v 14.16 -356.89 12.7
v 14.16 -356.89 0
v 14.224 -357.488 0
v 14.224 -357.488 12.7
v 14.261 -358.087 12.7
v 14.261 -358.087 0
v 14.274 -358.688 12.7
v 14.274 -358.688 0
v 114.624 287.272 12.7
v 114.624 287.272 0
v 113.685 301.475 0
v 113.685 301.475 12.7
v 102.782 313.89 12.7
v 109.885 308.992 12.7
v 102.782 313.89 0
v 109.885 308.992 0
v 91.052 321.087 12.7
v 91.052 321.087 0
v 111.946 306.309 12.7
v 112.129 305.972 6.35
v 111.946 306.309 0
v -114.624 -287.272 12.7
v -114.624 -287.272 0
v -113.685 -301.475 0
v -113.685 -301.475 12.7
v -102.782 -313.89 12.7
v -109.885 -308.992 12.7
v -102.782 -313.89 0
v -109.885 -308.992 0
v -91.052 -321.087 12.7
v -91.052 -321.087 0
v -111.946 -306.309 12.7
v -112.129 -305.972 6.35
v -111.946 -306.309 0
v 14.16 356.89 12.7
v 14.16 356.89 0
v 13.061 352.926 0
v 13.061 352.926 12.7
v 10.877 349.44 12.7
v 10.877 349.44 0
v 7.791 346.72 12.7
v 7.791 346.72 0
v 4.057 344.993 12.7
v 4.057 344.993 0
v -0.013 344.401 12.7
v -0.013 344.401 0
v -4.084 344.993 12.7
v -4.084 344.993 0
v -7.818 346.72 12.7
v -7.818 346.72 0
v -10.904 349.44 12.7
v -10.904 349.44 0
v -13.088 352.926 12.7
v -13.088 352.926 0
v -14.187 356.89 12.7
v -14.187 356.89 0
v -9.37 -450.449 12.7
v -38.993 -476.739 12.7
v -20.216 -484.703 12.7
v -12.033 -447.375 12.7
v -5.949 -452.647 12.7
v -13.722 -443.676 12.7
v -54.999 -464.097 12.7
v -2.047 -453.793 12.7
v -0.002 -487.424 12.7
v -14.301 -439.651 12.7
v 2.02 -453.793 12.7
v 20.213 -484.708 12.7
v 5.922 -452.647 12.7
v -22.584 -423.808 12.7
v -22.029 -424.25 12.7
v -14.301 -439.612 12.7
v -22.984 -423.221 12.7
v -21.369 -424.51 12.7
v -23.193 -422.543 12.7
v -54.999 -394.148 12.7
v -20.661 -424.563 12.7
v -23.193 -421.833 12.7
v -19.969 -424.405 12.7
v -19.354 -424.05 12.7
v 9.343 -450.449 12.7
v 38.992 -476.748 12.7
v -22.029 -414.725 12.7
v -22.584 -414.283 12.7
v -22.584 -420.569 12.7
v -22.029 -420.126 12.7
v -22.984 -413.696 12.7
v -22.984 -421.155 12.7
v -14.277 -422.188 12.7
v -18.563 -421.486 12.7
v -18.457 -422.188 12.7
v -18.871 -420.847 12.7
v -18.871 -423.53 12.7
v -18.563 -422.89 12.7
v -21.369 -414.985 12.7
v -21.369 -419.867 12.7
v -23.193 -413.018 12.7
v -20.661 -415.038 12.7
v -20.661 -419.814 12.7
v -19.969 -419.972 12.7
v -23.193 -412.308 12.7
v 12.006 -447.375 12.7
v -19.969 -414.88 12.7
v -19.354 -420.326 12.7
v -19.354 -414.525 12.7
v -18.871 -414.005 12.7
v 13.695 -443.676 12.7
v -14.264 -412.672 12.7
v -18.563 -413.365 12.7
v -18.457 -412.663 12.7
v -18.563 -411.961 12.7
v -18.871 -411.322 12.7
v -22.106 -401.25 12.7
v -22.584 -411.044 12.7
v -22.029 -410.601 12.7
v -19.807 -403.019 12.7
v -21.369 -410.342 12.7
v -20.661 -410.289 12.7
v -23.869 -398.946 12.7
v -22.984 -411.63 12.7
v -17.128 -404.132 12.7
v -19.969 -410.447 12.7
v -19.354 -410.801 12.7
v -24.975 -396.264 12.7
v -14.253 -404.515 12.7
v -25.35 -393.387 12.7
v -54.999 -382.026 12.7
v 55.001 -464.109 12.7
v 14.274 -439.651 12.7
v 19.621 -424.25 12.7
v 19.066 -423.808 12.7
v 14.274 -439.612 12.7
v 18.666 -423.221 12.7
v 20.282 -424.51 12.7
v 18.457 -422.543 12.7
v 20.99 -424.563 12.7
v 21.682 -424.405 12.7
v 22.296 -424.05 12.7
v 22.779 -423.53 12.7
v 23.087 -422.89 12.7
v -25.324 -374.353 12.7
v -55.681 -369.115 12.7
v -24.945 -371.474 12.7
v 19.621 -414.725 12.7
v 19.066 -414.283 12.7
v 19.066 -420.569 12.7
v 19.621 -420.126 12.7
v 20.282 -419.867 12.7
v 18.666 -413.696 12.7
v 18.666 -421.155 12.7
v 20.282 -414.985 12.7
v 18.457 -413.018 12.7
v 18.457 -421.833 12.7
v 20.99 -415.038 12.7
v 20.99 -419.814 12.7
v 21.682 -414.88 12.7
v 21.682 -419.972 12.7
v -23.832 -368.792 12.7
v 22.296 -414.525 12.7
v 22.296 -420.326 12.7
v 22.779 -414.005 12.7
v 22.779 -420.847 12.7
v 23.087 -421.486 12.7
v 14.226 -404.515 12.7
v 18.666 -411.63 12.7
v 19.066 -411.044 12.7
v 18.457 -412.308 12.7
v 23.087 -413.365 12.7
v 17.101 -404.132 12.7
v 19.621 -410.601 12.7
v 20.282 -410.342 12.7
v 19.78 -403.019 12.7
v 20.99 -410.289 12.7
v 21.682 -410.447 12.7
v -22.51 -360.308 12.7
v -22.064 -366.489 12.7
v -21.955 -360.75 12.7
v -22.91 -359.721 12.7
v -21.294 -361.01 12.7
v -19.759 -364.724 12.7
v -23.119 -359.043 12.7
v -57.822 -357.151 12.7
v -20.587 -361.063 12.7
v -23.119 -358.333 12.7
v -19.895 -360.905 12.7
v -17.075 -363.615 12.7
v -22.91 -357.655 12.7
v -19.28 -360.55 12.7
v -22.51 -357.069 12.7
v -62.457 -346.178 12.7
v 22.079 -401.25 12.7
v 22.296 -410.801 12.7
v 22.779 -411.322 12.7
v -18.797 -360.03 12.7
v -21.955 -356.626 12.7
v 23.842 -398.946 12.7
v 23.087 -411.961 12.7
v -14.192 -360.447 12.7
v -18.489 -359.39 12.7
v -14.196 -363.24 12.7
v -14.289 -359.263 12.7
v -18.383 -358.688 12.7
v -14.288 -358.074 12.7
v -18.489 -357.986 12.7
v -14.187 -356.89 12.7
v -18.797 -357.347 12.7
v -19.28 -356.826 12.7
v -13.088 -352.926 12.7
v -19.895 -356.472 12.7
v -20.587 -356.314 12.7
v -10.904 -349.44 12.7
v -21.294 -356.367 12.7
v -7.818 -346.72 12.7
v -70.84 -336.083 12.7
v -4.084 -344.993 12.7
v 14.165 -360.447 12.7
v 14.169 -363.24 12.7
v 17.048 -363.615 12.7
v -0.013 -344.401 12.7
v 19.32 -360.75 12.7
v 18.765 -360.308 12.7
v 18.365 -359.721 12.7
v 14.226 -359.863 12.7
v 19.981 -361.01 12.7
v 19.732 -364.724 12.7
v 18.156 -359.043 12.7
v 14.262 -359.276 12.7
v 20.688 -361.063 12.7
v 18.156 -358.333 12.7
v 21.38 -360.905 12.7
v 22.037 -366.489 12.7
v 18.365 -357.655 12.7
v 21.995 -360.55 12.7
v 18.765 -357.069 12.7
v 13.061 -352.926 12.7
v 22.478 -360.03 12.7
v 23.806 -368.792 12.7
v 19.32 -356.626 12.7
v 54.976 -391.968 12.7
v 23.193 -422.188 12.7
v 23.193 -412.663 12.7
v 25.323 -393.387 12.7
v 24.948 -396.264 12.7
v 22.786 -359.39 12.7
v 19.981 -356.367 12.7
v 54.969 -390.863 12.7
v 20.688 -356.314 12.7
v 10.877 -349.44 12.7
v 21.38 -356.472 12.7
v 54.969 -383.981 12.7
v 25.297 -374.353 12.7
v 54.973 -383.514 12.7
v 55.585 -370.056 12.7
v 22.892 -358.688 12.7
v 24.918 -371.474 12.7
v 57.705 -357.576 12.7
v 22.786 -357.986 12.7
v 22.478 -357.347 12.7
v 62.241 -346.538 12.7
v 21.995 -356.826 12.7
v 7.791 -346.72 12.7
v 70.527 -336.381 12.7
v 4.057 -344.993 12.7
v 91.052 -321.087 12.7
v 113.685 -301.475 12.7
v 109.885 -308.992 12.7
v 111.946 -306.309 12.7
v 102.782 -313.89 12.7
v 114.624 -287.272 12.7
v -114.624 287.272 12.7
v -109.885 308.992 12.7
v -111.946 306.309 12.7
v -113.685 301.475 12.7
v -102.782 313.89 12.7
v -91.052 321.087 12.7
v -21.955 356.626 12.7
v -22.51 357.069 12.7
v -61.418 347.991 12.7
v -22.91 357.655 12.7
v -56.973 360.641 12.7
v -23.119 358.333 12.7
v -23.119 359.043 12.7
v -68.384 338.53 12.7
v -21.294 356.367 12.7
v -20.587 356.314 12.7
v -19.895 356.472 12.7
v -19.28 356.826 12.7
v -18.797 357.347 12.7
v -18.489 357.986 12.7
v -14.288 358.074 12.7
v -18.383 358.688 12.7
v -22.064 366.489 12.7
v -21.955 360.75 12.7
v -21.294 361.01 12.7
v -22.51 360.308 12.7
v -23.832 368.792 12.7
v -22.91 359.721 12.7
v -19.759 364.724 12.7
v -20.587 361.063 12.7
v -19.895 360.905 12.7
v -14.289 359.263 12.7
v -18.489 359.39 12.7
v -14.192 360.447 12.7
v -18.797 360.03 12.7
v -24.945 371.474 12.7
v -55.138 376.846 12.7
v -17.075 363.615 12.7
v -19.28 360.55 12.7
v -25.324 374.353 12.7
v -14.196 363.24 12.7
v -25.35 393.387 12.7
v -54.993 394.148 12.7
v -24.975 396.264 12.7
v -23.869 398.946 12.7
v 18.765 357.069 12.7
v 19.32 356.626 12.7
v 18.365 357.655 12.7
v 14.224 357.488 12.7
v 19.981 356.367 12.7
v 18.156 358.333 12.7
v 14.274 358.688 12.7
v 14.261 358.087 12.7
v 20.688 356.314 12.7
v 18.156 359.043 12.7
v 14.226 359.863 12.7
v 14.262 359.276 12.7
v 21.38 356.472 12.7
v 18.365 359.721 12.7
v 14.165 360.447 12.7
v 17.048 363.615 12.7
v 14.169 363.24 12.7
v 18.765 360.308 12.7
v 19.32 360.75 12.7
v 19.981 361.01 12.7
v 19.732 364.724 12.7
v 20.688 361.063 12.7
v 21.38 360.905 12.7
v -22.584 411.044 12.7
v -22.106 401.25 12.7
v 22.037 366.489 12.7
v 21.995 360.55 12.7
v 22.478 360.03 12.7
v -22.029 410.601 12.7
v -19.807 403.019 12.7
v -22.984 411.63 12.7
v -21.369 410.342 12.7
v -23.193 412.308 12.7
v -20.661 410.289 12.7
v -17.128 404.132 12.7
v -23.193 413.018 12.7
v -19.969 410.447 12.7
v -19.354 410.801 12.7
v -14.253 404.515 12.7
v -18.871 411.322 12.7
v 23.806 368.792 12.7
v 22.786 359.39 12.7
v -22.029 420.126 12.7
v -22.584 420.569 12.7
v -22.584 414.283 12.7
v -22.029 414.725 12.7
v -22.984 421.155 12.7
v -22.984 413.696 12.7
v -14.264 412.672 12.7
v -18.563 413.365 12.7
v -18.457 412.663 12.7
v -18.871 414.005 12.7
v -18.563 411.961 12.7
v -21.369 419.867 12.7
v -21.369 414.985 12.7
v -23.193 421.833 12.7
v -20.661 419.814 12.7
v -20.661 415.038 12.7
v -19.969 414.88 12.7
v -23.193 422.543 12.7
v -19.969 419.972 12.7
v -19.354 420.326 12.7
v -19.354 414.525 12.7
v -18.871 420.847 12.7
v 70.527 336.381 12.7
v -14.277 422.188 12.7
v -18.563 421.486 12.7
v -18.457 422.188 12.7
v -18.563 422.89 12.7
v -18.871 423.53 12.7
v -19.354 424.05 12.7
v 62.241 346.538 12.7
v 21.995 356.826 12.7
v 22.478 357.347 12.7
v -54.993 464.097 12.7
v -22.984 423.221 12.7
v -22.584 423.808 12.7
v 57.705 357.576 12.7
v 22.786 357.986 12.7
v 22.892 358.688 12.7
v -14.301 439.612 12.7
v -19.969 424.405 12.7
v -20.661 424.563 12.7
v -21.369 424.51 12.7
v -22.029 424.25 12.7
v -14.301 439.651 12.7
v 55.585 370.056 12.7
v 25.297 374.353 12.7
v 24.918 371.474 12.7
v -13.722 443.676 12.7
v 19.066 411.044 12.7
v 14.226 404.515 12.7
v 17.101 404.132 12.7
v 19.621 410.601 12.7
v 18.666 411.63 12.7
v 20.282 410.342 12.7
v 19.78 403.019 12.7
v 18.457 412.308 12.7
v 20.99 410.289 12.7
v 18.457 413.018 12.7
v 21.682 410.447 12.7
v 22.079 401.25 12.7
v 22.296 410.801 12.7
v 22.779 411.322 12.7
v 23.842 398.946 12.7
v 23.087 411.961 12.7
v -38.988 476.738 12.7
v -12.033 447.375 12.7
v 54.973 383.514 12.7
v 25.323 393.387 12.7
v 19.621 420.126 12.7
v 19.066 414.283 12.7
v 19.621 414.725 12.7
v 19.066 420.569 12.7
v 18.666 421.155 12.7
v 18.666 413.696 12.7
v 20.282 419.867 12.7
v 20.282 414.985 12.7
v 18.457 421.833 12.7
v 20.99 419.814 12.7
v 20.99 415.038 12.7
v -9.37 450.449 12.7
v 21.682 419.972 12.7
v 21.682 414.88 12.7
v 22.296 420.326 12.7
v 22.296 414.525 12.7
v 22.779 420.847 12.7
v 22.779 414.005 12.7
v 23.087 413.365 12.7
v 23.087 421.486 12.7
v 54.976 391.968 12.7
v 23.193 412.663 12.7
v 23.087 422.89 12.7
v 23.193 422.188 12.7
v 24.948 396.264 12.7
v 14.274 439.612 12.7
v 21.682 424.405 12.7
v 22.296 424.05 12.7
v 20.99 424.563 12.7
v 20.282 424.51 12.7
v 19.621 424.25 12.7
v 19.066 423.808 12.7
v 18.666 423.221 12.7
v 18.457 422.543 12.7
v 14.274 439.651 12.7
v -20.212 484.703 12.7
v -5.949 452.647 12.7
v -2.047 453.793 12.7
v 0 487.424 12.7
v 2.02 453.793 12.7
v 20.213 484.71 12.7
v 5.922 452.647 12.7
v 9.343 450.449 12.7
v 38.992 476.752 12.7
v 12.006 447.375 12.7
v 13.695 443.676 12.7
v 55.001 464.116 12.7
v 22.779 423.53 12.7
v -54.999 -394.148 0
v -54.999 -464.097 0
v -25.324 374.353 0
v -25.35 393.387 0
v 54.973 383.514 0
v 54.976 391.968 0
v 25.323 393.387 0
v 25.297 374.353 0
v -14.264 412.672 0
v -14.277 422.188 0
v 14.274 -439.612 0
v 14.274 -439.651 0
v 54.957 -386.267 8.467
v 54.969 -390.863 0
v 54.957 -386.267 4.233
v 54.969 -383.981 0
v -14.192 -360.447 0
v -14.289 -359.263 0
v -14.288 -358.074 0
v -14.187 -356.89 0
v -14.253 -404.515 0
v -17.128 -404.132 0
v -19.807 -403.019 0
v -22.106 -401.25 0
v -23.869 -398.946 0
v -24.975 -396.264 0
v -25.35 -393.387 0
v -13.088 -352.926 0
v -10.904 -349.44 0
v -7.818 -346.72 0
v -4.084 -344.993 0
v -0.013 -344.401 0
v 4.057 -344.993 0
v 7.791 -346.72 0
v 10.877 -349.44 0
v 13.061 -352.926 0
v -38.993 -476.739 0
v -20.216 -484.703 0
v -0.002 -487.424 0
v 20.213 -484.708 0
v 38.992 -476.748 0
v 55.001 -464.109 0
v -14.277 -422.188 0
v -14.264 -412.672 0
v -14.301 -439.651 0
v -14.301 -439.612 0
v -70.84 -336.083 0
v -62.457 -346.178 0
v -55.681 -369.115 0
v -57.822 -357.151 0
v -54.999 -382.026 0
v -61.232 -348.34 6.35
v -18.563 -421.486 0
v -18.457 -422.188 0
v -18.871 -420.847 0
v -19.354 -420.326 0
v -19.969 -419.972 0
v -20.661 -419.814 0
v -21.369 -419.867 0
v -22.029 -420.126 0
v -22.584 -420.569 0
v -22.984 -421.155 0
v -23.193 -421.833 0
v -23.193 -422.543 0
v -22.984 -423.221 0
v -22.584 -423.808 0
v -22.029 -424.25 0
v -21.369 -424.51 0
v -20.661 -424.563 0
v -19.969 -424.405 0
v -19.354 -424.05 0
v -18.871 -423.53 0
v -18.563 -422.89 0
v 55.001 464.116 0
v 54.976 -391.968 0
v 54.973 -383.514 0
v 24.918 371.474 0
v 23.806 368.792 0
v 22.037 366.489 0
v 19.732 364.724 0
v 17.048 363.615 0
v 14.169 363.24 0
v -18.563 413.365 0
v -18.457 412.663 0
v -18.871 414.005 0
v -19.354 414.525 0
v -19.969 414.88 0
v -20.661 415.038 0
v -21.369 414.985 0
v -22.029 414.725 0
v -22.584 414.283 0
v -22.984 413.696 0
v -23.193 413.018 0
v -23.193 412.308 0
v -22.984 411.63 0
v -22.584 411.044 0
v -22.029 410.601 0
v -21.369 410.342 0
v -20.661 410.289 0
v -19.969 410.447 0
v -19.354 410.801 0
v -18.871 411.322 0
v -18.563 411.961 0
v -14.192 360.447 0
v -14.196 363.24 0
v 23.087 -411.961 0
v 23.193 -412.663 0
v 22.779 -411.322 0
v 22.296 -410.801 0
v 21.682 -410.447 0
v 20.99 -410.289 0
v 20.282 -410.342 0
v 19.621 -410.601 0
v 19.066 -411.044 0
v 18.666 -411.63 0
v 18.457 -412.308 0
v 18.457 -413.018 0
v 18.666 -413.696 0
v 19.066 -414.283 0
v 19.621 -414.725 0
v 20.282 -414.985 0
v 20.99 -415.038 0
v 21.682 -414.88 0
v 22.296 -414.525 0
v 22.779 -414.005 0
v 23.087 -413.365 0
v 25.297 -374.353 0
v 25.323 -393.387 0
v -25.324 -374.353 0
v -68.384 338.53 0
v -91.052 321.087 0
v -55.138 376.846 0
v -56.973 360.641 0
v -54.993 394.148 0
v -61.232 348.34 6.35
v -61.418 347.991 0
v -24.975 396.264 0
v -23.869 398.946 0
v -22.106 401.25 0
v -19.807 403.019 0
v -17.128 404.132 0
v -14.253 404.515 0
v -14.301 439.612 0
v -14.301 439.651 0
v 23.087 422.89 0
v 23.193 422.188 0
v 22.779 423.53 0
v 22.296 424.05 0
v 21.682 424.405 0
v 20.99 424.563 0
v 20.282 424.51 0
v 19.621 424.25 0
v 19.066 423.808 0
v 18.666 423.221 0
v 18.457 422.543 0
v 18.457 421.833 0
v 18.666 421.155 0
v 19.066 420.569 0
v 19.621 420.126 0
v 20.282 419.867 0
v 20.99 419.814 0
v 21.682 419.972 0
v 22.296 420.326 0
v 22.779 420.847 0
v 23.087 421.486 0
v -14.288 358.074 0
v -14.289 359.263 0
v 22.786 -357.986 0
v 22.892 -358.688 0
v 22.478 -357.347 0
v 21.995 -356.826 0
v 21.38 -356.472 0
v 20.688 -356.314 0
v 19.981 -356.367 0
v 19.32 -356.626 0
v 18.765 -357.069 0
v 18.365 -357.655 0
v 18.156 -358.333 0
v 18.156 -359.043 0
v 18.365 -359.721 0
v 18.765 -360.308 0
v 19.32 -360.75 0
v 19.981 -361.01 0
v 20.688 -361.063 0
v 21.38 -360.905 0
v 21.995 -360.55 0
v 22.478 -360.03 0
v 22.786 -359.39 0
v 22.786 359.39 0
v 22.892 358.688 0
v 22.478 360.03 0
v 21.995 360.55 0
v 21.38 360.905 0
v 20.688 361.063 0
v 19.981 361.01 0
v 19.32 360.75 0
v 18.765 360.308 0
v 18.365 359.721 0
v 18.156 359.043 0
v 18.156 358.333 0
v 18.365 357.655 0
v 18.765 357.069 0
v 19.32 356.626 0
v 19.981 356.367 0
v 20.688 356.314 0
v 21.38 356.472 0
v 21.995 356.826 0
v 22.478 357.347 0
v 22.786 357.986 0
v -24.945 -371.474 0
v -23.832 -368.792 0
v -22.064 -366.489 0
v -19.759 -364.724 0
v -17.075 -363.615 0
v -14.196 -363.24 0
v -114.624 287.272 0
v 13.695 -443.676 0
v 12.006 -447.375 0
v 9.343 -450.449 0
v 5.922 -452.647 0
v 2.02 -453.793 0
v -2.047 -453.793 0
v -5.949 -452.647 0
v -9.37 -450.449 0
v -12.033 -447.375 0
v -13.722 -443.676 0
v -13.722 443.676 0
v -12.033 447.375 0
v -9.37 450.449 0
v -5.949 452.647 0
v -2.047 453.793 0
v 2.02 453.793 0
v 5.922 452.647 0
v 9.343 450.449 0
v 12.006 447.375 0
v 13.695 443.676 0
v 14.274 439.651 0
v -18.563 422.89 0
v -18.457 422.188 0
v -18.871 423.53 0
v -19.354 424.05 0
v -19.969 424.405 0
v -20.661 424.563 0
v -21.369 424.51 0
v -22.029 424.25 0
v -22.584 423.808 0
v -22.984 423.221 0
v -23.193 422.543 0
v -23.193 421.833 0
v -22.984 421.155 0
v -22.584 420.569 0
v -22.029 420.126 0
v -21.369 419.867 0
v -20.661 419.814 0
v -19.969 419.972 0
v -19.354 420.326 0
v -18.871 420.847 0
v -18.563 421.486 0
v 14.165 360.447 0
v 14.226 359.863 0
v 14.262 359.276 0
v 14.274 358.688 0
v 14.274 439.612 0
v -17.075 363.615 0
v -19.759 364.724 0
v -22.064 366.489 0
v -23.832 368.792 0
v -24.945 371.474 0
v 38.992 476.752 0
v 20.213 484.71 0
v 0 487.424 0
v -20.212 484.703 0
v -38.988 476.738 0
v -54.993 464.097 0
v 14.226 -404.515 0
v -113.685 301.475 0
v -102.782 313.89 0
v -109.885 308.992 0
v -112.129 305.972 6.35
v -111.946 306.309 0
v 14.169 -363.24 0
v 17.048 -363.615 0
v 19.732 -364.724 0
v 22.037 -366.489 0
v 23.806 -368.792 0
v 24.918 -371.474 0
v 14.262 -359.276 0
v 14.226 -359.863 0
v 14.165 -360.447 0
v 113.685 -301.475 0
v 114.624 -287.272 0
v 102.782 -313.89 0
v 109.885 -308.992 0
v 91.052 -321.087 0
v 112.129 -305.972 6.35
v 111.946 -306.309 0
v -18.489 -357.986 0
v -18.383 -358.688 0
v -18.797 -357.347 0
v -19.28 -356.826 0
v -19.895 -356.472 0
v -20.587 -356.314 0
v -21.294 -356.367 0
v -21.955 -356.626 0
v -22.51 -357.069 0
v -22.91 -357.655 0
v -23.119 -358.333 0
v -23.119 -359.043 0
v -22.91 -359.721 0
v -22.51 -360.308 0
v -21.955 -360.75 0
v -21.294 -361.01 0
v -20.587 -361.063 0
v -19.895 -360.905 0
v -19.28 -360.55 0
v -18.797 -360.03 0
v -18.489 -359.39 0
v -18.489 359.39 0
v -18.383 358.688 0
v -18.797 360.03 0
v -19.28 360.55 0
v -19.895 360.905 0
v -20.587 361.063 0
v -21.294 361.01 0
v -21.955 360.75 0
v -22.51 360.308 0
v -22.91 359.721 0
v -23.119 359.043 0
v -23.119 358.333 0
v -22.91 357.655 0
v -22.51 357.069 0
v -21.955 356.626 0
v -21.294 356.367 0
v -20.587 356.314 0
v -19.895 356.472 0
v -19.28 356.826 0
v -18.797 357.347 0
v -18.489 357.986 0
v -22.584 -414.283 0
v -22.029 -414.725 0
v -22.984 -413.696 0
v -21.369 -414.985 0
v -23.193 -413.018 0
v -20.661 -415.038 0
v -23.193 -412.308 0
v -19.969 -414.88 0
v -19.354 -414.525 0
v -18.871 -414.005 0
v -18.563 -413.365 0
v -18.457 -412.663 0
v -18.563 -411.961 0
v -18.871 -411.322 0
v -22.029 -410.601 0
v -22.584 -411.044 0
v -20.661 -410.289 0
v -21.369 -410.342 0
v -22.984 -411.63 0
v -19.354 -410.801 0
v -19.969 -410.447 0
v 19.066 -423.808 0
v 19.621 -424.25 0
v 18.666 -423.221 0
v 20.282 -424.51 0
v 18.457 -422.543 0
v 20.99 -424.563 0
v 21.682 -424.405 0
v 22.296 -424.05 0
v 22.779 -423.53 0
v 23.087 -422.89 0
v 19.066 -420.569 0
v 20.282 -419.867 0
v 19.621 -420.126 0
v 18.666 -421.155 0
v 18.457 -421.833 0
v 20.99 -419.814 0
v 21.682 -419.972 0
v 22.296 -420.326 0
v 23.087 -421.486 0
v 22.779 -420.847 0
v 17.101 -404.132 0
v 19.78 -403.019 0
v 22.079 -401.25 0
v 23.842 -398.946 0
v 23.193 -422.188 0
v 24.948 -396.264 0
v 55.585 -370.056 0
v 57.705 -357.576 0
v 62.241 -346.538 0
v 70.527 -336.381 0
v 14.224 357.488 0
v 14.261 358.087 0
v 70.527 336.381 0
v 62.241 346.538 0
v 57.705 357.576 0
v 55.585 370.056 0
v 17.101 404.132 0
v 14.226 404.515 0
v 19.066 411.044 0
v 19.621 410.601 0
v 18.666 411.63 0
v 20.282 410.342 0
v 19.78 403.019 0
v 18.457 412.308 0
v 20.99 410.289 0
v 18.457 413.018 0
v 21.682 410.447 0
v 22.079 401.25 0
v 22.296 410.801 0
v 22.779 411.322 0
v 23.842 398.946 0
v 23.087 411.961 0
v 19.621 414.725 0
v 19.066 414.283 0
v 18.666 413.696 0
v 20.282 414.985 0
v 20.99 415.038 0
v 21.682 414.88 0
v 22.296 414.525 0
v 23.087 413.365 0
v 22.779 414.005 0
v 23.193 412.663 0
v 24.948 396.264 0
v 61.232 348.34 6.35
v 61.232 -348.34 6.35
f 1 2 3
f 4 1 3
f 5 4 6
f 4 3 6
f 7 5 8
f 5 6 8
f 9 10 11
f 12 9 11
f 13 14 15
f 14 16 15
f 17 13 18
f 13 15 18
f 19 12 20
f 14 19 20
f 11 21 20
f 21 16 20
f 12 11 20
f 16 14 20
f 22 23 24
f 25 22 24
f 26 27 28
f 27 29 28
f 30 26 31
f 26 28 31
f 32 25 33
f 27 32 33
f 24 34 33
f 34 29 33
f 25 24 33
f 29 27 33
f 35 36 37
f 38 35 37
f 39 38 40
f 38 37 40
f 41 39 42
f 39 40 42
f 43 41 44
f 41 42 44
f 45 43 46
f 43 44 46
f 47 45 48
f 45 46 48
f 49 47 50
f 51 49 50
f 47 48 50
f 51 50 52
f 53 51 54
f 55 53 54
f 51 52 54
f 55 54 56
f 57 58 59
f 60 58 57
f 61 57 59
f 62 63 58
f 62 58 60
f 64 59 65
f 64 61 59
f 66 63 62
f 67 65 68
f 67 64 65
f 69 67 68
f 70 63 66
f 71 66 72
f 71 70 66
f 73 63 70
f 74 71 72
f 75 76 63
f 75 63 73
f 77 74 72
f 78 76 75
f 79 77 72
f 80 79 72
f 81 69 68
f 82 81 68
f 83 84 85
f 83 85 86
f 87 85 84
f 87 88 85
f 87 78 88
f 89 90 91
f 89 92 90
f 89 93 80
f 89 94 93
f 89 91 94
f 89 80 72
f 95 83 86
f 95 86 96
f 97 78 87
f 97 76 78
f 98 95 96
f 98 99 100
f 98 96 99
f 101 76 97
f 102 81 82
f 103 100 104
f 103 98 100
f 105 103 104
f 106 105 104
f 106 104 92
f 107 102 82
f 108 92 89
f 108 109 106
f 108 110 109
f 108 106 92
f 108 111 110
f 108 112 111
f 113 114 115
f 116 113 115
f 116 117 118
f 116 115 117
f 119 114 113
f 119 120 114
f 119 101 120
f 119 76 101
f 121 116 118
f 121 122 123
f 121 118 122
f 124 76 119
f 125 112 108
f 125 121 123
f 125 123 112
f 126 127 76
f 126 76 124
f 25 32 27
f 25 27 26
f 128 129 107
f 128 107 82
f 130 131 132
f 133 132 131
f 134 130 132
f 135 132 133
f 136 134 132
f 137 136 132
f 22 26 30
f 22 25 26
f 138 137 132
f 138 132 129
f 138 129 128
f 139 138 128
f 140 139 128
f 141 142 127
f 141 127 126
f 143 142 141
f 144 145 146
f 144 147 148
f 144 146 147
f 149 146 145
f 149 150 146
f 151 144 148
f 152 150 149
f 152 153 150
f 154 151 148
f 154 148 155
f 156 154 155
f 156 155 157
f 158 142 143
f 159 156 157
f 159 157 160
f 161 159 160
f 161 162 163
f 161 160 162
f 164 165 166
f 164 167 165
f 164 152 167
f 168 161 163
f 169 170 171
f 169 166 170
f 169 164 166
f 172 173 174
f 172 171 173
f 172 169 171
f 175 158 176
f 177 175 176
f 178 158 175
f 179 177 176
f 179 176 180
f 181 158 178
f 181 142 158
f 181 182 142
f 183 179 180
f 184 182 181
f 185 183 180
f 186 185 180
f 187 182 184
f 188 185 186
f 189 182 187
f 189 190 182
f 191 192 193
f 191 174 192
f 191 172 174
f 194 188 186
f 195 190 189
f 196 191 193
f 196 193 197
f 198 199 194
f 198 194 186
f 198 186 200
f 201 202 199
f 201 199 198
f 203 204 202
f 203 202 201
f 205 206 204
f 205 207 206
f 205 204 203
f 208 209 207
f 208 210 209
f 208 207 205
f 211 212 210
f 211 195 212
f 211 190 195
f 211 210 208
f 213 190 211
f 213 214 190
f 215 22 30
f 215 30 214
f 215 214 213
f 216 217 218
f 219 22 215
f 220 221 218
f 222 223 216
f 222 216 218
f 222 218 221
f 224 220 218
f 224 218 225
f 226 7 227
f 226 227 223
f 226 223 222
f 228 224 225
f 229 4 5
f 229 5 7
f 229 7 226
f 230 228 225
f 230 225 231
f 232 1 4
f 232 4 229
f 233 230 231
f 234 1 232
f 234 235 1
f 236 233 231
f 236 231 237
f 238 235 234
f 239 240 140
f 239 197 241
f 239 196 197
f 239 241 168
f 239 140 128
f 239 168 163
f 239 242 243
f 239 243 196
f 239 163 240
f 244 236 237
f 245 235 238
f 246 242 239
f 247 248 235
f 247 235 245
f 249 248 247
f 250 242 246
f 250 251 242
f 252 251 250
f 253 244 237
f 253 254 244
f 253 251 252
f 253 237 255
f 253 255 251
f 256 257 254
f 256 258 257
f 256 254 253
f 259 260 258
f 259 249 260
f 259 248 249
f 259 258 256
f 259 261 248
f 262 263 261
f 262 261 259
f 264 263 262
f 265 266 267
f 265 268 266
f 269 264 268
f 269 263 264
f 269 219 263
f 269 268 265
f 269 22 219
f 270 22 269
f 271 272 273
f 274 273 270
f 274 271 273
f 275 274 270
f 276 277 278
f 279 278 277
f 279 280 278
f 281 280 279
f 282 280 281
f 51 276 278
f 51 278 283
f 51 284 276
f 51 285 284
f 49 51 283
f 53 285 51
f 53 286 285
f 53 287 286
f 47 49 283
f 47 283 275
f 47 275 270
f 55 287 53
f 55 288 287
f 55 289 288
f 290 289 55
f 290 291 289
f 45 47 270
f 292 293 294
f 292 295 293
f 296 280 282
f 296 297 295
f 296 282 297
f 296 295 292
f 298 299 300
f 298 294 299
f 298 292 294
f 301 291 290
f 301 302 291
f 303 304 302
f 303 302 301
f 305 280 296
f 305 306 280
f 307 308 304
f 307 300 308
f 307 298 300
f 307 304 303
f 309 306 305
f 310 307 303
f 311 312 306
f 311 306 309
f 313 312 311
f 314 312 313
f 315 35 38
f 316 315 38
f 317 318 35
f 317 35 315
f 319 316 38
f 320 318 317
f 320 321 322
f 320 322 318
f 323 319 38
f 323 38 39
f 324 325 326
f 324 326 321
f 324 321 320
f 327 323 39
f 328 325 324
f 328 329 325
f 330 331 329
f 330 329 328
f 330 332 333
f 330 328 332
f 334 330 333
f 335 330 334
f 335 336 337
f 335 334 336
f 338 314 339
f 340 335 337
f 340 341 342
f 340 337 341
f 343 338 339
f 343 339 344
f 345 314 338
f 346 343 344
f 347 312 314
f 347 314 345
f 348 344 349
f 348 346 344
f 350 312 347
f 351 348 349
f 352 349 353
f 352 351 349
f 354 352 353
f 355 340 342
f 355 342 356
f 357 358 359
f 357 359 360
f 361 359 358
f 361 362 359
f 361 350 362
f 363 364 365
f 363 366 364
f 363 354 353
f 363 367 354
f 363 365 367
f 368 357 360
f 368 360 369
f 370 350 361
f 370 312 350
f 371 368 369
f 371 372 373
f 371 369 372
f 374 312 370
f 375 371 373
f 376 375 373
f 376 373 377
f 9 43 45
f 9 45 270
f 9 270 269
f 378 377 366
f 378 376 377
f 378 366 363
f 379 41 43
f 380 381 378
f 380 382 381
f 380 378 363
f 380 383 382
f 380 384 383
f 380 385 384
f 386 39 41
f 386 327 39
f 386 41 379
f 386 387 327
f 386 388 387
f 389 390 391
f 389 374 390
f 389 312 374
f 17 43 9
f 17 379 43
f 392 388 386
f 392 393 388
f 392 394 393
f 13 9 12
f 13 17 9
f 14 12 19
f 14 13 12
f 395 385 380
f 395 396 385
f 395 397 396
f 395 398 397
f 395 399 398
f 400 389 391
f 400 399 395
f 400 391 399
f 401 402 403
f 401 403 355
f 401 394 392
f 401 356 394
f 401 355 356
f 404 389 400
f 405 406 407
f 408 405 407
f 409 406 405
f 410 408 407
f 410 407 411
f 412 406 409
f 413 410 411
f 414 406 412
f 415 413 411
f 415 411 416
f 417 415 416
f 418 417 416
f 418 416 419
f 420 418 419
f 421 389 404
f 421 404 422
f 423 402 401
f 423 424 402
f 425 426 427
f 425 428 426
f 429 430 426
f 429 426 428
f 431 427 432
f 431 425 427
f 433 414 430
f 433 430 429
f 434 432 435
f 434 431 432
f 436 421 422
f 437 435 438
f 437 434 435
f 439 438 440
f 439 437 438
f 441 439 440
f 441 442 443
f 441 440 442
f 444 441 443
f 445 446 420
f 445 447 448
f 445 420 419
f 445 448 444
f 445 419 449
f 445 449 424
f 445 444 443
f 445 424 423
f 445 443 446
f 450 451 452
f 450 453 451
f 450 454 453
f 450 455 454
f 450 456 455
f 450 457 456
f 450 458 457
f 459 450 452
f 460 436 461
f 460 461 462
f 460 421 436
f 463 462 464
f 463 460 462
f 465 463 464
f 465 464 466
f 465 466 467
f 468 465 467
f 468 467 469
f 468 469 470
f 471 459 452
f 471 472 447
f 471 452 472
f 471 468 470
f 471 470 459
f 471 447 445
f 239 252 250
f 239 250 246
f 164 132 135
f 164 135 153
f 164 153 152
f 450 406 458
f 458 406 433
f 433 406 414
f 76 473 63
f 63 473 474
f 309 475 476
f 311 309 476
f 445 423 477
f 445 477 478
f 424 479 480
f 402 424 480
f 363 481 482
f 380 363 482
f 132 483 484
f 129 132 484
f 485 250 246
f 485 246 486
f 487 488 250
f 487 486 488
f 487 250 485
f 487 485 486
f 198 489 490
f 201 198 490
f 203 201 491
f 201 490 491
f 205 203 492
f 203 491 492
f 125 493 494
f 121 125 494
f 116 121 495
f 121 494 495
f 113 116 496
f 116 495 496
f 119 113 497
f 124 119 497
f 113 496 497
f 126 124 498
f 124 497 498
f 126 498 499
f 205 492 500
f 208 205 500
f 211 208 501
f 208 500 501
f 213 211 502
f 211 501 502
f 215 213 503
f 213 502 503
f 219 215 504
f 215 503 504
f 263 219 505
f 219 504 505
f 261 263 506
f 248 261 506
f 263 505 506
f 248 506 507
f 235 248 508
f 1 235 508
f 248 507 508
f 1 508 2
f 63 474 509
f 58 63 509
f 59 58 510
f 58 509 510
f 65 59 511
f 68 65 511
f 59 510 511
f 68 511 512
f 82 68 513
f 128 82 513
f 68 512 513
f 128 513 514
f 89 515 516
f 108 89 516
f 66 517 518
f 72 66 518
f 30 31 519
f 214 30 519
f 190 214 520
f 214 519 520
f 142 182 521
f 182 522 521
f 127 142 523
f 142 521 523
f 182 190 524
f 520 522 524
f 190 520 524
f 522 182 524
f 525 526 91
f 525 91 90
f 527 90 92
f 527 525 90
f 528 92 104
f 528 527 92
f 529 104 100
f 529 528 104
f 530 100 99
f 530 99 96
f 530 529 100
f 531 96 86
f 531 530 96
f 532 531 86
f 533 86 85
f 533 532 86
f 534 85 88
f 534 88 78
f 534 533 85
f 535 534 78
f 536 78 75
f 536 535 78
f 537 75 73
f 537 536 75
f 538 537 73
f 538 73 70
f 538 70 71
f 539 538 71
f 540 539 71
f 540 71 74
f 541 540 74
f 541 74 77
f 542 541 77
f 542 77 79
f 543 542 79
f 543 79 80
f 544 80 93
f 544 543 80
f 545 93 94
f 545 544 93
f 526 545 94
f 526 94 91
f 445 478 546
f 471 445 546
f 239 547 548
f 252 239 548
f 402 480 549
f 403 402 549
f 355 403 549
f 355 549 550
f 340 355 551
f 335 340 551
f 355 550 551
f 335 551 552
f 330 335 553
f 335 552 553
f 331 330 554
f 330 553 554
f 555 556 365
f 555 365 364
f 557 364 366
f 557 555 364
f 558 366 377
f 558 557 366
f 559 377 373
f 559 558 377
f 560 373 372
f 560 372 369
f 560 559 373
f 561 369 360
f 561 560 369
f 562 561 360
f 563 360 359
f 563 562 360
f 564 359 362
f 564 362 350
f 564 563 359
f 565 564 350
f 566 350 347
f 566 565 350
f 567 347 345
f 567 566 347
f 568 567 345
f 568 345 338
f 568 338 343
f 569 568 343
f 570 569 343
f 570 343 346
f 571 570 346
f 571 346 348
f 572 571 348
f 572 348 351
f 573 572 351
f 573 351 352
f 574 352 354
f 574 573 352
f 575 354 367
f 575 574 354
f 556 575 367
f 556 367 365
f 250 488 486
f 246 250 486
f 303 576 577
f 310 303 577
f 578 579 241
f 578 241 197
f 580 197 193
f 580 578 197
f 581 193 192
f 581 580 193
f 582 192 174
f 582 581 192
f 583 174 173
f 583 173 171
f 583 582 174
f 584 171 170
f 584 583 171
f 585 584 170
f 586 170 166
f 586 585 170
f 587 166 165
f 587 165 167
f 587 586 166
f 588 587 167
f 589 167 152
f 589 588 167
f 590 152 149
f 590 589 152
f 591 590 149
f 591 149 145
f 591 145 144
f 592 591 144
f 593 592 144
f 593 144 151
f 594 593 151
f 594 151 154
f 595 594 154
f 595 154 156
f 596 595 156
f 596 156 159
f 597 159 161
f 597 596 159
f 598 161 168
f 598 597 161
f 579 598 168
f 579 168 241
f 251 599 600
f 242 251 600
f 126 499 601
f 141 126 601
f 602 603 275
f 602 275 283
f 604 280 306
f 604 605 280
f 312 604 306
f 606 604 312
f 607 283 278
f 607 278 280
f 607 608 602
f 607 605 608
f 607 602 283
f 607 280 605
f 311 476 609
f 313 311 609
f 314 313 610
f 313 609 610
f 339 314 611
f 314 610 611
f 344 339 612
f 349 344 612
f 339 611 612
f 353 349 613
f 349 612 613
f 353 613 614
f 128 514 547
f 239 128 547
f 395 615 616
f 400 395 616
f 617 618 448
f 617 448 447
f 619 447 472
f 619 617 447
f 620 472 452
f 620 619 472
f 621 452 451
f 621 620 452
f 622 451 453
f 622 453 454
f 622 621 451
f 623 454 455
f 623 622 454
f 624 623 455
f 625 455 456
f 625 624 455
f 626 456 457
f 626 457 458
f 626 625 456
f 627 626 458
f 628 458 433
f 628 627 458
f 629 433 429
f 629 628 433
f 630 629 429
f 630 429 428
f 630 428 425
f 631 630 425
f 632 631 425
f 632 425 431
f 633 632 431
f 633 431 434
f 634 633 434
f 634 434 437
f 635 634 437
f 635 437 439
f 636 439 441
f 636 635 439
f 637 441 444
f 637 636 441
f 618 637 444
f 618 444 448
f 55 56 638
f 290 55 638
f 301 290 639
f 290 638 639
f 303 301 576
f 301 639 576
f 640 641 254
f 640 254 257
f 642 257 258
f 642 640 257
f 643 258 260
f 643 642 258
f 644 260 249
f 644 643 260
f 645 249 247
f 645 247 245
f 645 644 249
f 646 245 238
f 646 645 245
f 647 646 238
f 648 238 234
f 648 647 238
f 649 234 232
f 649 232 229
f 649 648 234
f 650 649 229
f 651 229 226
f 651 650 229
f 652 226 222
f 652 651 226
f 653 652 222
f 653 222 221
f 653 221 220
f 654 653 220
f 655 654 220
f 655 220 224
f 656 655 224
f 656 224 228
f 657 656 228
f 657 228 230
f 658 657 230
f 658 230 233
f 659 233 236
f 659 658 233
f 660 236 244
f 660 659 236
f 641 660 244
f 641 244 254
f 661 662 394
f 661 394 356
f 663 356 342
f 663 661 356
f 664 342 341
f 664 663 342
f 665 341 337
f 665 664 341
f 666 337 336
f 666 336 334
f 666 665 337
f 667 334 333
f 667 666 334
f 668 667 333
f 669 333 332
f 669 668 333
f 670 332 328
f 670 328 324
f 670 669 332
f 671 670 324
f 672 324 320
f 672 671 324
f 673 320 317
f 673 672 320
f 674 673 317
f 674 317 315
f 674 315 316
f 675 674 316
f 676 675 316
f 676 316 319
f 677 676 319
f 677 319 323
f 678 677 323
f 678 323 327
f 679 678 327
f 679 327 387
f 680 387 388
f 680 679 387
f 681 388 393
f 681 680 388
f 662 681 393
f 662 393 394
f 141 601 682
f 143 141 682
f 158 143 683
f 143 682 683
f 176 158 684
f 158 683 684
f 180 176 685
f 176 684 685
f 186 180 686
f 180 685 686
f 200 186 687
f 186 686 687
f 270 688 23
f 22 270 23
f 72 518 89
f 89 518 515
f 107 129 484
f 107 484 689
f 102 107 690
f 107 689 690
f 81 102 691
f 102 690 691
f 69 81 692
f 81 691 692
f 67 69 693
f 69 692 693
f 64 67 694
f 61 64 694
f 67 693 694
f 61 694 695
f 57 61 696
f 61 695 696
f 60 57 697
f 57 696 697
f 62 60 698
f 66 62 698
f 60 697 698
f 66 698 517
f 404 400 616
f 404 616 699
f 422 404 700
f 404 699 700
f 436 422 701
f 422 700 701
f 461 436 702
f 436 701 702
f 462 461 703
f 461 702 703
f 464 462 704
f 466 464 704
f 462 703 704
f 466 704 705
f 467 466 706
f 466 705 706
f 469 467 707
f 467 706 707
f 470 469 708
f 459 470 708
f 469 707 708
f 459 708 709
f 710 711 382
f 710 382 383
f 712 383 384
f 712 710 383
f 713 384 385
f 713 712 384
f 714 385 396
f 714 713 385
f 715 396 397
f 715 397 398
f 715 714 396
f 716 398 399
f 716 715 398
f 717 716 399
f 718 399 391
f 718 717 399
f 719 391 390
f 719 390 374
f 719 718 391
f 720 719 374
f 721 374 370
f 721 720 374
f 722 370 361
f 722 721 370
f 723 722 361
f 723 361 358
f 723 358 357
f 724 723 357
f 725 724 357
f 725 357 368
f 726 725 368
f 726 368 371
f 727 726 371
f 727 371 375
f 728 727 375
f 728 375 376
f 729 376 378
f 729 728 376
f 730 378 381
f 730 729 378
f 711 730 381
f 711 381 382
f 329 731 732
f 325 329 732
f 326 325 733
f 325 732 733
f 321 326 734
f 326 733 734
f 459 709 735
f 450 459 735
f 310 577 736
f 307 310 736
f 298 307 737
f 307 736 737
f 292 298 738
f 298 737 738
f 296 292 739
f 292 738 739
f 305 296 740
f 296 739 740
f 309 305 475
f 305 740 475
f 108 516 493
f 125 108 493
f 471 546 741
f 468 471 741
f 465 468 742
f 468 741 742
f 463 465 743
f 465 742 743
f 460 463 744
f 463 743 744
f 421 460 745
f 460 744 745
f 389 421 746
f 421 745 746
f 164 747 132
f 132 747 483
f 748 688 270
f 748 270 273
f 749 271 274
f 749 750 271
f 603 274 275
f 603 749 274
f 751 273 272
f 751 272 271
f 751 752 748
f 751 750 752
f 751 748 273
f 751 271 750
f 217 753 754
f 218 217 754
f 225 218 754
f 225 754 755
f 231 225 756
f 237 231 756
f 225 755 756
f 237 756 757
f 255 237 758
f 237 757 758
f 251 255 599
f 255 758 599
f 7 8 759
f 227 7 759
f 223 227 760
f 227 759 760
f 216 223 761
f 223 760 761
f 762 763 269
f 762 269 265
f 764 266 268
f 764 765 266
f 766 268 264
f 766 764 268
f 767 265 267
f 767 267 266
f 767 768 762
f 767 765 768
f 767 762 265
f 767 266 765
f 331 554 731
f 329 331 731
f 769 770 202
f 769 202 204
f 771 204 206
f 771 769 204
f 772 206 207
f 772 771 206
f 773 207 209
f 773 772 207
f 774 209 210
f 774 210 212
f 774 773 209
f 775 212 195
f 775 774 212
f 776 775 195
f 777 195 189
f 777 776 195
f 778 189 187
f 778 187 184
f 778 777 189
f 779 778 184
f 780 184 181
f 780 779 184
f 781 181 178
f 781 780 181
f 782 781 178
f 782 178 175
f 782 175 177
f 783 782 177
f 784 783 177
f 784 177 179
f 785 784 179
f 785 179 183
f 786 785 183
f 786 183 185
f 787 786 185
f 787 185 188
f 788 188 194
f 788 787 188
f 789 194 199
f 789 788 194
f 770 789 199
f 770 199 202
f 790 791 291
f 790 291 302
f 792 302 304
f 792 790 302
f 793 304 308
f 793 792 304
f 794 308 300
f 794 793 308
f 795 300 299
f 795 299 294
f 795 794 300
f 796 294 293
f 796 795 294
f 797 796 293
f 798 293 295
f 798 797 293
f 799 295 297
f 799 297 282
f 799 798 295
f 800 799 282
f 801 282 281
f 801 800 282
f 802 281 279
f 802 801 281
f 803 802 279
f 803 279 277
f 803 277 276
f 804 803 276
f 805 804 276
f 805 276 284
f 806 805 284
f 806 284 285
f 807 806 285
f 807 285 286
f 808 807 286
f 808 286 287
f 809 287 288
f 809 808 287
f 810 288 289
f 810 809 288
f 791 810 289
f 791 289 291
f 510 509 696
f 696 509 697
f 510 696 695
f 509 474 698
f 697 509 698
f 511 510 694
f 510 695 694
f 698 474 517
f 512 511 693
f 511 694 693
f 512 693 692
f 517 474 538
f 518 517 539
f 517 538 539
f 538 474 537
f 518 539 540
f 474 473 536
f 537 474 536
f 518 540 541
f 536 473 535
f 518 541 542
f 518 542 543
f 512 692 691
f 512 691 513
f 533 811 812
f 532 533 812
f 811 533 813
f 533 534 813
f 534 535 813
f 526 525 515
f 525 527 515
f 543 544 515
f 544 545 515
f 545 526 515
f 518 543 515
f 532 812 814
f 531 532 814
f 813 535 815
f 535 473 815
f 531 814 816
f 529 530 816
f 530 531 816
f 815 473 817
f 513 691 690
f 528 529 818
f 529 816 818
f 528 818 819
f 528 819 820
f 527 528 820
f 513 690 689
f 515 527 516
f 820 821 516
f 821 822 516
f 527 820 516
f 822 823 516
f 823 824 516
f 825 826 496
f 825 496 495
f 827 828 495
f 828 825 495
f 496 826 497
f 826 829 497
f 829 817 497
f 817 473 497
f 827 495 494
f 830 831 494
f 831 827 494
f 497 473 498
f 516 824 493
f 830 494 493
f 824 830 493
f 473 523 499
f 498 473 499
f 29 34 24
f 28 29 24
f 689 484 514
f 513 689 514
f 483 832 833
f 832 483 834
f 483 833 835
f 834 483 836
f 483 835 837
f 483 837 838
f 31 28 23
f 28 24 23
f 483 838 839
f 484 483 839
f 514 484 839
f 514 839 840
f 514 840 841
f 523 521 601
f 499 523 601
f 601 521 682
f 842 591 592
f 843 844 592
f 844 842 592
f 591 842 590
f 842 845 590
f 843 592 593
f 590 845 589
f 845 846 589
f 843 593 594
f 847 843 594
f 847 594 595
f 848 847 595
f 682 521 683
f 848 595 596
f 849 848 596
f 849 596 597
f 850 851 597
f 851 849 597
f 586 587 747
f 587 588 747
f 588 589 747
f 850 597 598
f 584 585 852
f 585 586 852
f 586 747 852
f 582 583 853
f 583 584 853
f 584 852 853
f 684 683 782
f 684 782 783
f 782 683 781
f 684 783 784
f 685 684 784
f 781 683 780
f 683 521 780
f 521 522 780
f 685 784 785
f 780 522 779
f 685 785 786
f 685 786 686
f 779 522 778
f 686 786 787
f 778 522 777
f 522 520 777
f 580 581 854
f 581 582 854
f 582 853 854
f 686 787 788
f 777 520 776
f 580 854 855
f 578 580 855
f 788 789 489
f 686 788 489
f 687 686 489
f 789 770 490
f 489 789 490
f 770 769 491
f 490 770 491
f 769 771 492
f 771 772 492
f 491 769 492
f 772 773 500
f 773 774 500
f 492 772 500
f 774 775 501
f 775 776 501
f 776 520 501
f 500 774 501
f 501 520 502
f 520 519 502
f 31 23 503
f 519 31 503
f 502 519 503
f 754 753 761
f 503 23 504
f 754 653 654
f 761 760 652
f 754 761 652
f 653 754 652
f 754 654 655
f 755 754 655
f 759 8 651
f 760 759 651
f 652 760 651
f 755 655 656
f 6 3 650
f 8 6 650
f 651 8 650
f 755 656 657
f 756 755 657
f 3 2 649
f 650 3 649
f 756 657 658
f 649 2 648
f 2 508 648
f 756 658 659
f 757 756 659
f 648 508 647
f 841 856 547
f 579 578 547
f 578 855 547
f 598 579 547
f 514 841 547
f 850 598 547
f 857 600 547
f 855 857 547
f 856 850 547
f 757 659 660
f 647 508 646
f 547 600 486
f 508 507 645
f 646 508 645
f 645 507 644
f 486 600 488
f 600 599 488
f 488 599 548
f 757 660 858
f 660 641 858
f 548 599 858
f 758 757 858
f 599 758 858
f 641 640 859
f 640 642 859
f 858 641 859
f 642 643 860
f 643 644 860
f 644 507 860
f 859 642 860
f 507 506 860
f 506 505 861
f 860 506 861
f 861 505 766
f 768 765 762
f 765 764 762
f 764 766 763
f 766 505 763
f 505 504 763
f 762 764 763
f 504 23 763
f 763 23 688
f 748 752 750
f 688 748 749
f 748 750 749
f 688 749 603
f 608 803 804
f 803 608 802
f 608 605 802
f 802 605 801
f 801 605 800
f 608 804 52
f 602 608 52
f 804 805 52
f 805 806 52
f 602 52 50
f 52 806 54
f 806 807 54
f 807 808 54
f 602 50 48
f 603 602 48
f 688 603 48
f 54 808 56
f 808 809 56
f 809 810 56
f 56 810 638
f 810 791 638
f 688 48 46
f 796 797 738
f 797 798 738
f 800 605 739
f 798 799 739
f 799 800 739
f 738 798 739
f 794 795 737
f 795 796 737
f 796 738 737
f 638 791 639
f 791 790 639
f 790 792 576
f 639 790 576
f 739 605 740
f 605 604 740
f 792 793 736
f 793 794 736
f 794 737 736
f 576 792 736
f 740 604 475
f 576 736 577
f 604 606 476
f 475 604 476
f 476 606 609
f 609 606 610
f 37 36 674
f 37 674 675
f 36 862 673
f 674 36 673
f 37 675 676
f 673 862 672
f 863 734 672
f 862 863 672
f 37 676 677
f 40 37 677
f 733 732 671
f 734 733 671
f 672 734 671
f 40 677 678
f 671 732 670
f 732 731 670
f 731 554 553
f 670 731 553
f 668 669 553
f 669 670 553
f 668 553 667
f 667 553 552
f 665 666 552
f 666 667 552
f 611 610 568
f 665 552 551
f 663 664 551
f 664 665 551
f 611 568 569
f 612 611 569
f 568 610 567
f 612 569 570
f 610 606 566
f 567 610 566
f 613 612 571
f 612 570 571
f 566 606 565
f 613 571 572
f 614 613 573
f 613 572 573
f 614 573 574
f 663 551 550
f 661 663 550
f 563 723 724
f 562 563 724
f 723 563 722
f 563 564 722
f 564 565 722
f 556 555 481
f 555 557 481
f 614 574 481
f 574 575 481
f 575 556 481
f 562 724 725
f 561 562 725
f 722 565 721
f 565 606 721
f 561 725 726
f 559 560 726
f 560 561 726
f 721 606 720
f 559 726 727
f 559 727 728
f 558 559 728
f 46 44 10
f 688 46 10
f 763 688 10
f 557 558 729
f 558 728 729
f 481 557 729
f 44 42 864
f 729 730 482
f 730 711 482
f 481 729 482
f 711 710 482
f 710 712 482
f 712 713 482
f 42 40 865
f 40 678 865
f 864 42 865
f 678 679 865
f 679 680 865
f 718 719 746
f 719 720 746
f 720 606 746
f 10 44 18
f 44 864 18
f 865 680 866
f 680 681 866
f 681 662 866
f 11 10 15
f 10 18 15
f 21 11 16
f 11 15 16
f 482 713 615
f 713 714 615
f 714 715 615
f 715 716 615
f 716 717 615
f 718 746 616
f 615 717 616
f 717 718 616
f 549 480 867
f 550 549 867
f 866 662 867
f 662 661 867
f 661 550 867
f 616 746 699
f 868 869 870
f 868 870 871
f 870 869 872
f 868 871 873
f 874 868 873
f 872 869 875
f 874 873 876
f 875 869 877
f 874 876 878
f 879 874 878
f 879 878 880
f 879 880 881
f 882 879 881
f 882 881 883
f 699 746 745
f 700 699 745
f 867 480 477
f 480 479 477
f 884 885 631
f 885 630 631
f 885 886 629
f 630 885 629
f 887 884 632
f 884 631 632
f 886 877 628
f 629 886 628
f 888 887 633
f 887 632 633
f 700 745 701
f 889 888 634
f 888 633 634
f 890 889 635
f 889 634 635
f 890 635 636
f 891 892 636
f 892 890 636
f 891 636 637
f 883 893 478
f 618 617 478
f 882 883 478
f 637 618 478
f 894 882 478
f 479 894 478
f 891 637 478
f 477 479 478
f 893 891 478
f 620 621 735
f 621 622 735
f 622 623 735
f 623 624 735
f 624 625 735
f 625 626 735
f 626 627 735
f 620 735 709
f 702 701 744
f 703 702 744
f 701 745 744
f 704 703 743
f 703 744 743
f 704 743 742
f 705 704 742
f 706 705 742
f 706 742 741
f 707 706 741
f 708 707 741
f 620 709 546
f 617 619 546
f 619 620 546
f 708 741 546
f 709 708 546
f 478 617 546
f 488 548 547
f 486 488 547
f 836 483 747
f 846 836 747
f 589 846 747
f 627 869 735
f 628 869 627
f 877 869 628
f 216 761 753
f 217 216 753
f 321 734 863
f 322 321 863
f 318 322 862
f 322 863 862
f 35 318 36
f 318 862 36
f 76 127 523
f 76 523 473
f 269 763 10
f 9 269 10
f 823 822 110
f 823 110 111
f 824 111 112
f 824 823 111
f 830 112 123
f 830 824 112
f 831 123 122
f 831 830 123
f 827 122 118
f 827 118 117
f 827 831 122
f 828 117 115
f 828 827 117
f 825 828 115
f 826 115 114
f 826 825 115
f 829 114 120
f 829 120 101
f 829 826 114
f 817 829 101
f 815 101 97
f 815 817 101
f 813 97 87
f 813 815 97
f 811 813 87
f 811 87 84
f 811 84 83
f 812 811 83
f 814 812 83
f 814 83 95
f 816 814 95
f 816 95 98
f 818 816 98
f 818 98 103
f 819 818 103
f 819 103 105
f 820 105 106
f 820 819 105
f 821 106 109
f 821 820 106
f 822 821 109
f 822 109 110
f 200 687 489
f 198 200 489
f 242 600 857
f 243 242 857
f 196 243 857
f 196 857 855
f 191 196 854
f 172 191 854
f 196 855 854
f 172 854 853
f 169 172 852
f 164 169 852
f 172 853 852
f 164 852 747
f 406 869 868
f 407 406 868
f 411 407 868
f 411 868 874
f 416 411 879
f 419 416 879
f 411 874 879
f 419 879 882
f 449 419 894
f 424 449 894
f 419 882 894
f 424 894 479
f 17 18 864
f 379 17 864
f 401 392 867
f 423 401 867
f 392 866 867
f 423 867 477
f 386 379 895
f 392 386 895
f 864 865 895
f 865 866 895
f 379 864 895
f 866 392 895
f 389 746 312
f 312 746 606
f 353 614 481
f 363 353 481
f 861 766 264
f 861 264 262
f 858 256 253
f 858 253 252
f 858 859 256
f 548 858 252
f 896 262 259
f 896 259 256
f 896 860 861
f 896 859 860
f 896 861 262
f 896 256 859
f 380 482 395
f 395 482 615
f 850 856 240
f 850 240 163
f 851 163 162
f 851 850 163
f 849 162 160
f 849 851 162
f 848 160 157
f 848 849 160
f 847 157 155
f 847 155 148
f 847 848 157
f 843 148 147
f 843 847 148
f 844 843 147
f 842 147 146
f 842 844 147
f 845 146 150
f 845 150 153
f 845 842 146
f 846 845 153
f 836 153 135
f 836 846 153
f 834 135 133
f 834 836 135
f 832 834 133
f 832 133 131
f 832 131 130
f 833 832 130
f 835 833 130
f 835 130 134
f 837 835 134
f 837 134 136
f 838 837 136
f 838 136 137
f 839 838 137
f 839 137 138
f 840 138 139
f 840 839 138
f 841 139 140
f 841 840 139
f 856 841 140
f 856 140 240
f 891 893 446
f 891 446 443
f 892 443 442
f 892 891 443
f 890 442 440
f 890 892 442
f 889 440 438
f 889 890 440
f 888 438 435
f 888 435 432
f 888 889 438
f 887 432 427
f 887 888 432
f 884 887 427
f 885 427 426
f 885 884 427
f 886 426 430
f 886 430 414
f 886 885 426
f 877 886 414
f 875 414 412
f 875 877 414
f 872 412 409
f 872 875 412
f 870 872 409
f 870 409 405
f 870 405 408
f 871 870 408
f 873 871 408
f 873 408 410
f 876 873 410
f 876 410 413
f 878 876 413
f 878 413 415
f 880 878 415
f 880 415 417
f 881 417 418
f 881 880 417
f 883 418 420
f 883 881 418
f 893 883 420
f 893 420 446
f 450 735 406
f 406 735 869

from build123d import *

# Parameters (mm, degrees)
F0_R     = 2.38125
F1_DEPTH = 12.7


with BuildPart() as f1:
    # F0 (on Top) → F1 (new body)
    with BuildSketch(Plane.XY):
        with BuildLine():
            Line((-54.9985197177, -382.026025871), (-54.9992847525, -394.1482991889))
            add(Edge.make_bspline(
                [(-54.9985197177, -382.026025871), (-54.9354455758, -386.0255511518), (-54.9675123774, -390.0869308064), (-54.9992847525, -394.1482991889)],
                knots=[0.8743339951, 0.8743339951, 0.8743339951, 0.8743339951, 1, 1, 1, 1], degree=3))
        make_face()
        with BuildLine():
            add(Edge.make_bspline(
                [(-54.9985197177, -382.026025871), (-54.9354455758, -386.0255511518), (-54.9675123774, -390.0869308064), (-54.9992847525, -394.1482991889)],
                knots=[0.8743339951, 0.8743339951, 0.8743339951, 0.8743339951, 1, 1, 1, 1], degree=3))
            Line((-54.9992847525, -394.1482991889), (-54.9992847525, -464.0970221375))
            ThreePointArc((-54.9992847525, -464.0970221375), (-0.0018759394, -487.4241320019), (55.000743191, -464.1093101158))
            Line((55.000743191, -464.1093101158), (54.9761007121, -391.9680777589))
            add(Edge.make_bspline(
                [(54.9687721704, -390.8628424946), (54.9710268923, -391.2311321553), (54.97349351, -391.5995593372), (54.9761007121, -391.9680777589)],
                knots=[0.966101498, 0.966101498, 0.966101498, 0.966101498, 0.9775096829, 0.9775096829, 0.9775096829, 0.9775096829], degree=3))
            add(Edge.make_bspline(
                [(54.9687721704, -383.9808695319), (54.9488585997, -386.2619365341), (54.9546720058, -388.559700445), (54.9687721704, -390.8628424946)],
                knots=[0.8947590922, 0.8947590922, 0.8947590922, 0.8947590922, 0.966101498, 0.966101498, 0.966101498, 0.966101498], degree=3))
            add(Edge.make_bspline(
                [(54.9732129835, -383.5142081144), (54.971609259, -383.6696817984), (54.9701308343, -383.8252368026), (54.9687721704, -383.9808695319)],
                knots=[0.8898915397, 0.8898915397, 0.8898915397, 0.8898915397, 0.8947590922, 0.8947590922, 0.8947590922, 0.8947590922], degree=3))
            add(Edge.make_bspline(
                [(91.0522177535, -321.0871368647), (79.1806262303, -328.9177700097), (57.3146361539, -343.3408190429), (55.1072249943, -370.5223627567), (54.9732129835, -383.5142081144)],
                knots=[0, 0, 0, 0, 0.4831443178, 0.8898915397, 0.8898915397, 0.8898915397, 0.8898915397], degree=3))
            add(Edge.make_bspline(
                [(114.6235545891, -287.2718525976), (114.7522390143, -293.5334884003), (114.407941027, -310.3003483875), (103.1780495584, -312.9231176806), (91.0522177535, -321.0871368647)],
                knots=[0, 0, 0, 0, 0.4602994573, 1, 1, 1, 1], degree=3))
            Line((114.6235545891, -287.2718525976), (114.6235545891, 287.2718525976))
            add(Edge.make_bspline(
                [(114.6235545891, 287.2718525976), (114.7522390143, 293.5334884003), (114.407941027, 310.3003483875), (103.1780495584, 312.9231176806), (91.0522177535, 321.0871368647)],
                knots=[0, 0, 0, 0, 0.4602994573, 1, 1, 1, 1], degree=3))
            add(Edge.make_bspline(
                [(91.0522177535, 321.0871368647), (79.1806262303, 328.9177700097), (57.3146361539, 343.3408190429), (55.1072249943, 370.5223627567), (54.9732129835, 383.5142081144)],
                knots=[0, 0, 0, 0, 0.4831443178, 0.8898915397, 0.8898915397, 0.8898915397, 0.8898915397], degree=3))
            add(Edge.make_bspline(
                [(54.9732129835, 383.5142081144), (54.9443452176, 386.3128046538), (54.9560766494, 389.1377502314), (54.9761007121, 391.9680777589)],
                knots=[0.8898915397, 0.8898915397, 0.8898915397, 0.8898915397, 0.9775096829, 0.9775096829, 0.9775096829, 0.9775096829], degree=3))
            Line((54.9761007121, 391.9680777589), (55.0007455459, 464.116204095))
            ThreePointArc((55.0007455459, 464.116204095), (0, 487.4241321885), (-54.9926131403, 464.0970230103))
            Line((-54.9926131403, 464.0970230103), (-54.9926131403, 394.1483000617))
            add(Edge.make_bspline(
                [(-91.0522177535, 321.0871368647), (-79.1806262303, 328.9177700097), (-54.6091036329, 345.1254182344), (-54.8619355351, 377.444169717), (-54.9926131403, 394.1483000617)],
                knots=[0, 0, 0, 0, 0.4831443178, 1, 1, 1, 1], degree=3))
            add(Edge.make_bspline(
                [(-114.6235545891, 287.2718525976), (-114.7522390143, 293.5334884003), (-114.407941027, 310.3003483875), (-103.1780495584, 312.9231176806), (-91.0522177535, 321.0871368647)],
                knots=[0, 0, 0, 0, 0.4602994573, 1, 1, 1, 1], degree=3))
            Line((-114.6235545891, 287.2718525976), (-114.6235545891, -287.2718525976))
            add(Edge.make_bspline(
                [(-114.6235545891, -287.2718525976), (-114.7522390143, -293.5334884003), (-114.407941027, -310.3003483875), (-103.1780495584, -312.9231176806), (-91.0522177535, -321.0871368647)],
                knots=[0, 0, 0, 0, 0.4602994573, 1, 1, 1, 1], degree=3))
            add(Edge.make_bspline(
                [(-91.0522177535, -321.0871368647), (-79.1805664511, -328.9178094407), (-57.6943096428, -343.0884182066), (-55.1948639857, -369.5758546835), (-54.9985197177, -382.026025871)],
                knots=[0, 0, 0, 0, 0.4831467507, 0.8743339951, 0.8743339951, 0.8743339951, 0.8743339951], degree=3))
        make_face()
        with Locations((-20.8386558141, -422.188183992)):
            Circle(F0_R, mode=Mode.SUBTRACT)
        with Locations((-20.8386558141, -412.663183992)):
            Circle(F0_R, mode=Mode.SUBTRACT)
        with BuildLine():
            ThreePointArc((14.2740352273, -439.6507348414), (-0.0134647727, -453.9382348414), (-14.3009647727, -439.6507348414))
            Line((-14.3009647727, -439.6507348414), (-14.3009109322, -439.6115112433))
            Line((-14.3009109322, -439.6115112433), (-14.2769947735, -422.1882512927))
            Line((-14.2769947735, -422.1882512927), (-14.2639325118, -412.6722088316))
            Line((-14.2639325118, -412.6722088316), (-14.2527355698, -404.5150782267))
            ThreePointArc((-14.2527355698, -404.5150782267), (-22.1059867444, -401.2495172858), (-25.3499714565, -393.3873289481))
            Line((-25.3499714565, -393.3873289481), (-25.3238328191, -374.3525886957))
            ThreePointArc((-25.3238328191, -374.3525886957), (-22.0636620984, -366.4894734645), (-14.1960791833, -363.2400991647))
            Line((-14.1960791833, -363.2400991647), (-14.1922458286, -360.447446034))
            ThreePointArc((-14.1922458286, -360.447446034), (-14.3009513126, -358.6686230238), (-14.1873628199, -356.890105147))
            ThreePointArc((-14.1873628199, -356.890105147), (-0.0134647727, -344.4007348414), (14.1604332745, -356.890105147))
            ThreePointArc((14.1604332745, -356.890105147), (14.2456064558, -357.7873774996), (14.2740352273, -358.6882348414))
            ThreePointArc((14.2740352273, -358.6882348414), (14.2468295894, -359.5695185399), (14.1653162831, -360.447446034))
            Line((14.1653162831, -360.447446034), (14.1691496379, -363.2400991647))
            ThreePointArc((14.1691496379, -363.2400991647), (22.036732553, -366.4894734645), (25.2969032737, -374.3525886957))
            Line((25.2969032737, -374.3525886957), (25.3230419111, -393.3873289481))
            ThreePointArc((25.3230419111, -393.3873289481), (22.079057199, -401.2495172858), (14.2258060244, -404.5150782267))
            Line((14.2258060244, -404.5150782267), (14.2739813868, -439.6115112432))
            Line((14.2739813868, -439.6115112432), (14.2740352273, -439.6507348414))
        make_face(mode=Mode.SUBTRACT)
        with Locations((-20.7645667255, -358.6882348414)):
            Circle(F0_R, mode=Mode.SUBTRACT)
        with Locations((20.8117262687, -422.188183992)):
            Circle(F0_R, mode=Mode.SUBTRACT)
        with Locations((20.8117262687, -412.663183992)):
            Circle(F0_R, mode=Mode.SUBTRACT)
        with Locations((20.5104332745, -358.6882348414)):
            Circle(F0_R, mode=Mode.SUBTRACT)
        with Locations((-20.7645667255, 358.6882348414)):
            Circle(F0_R, mode=Mode.SUBTRACT)
        with Locations((-20.8386558141, 412.663183992)):
            Circle(F0_R, mode=Mode.SUBTRACT)
        with Locations((-20.8386558141, 422.188183992)):
            Circle(F0_R, mode=Mode.SUBTRACT)
        with BuildLine():
            ThreePointArc((14.1653162831, 360.447446034), (14.2468295894, 359.5695185399), (14.2740352273, 358.6882348414))
            ThreePointArc((14.2740352273, 358.6882348414), (14.2456064558, 357.7873774996), (14.1604332745, 356.890105147))
            ThreePointArc((14.1604332745, 356.890105147), (-0.0134647727, 344.4007348414), (-14.1873628199, 356.890105147))
            ThreePointArc((-14.1873628199, 356.890105147), (-14.3009513126, 358.6686230238), (-14.1922458286, 360.447446034))
            Line((-14.1922458286, 360.447446034), (-14.1960791833, 363.2400991647))
            ThreePointArc((-14.1960791833, 363.2400991647), (-22.0636620984, 366.4894734645), (-25.3238328191, 374.3525886957))
            Line((-25.3238328191, 374.3525886957), (-25.3499714565, 393.3873289481))
            ThreePointArc((-25.3499714565, 393.3873289481), (-22.1059867444, 401.2495172858), (-14.2527355698, 404.5150782267))
            Line((-14.2527355698, 404.5150782267), (-14.2639325118, 412.6722088316))
            Line((-14.2639325118, 412.6722088316), (-14.2769947735, 422.1882512927))
            Line((-14.2769947735, 422.1882512927), (-14.3009109322, 439.6115112433))
            Line((-14.3009109322, 439.6115112433), (-14.3009647727, 439.6507348414))
            ThreePointArc((-14.3009647727, 439.6507348414), (-0.0134647727, 453.9382348414), (14.2740352273, 439.6507348414))
            Line((14.2740352273, 439.6507348414), (14.2739813868, 439.6115112432))
            Line((14.2739813868, 439.6115112432), (14.2258060244, 404.5150782267))
            ThreePointArc((14.2258060244, 404.5150782267), (22.079057199, 401.2495172858), (25.3230419111, 393.3873289481))
            Line((25.3230419111, 393.3873289481), (25.2969032737, 374.3525886957))
            ThreePointArc((25.2969032737, 374.3525886957), (22.036732553, 366.4894734645), (14.1691496379, 363.2400991647))
            Line((14.1691496379, 363.2400991647), (14.1653162831, 360.447446034))
        make_face(mode=Mode.SUBTRACT)
        with Locations((20.5104332745, 358.6882348414)):
            Circle(F0_R, mode=Mode.SUBTRACT)
        with Locations((20.8117262687, 412.663183992)):
            Circle(F0_R, mode=Mode.SUBTRACT)
        with Locations((20.8117262687, 422.188183992)):
            Circle(F0_R, mode=Mode.SUBTRACT)
        with BuildLine():
            add(Edge.make_bspline(
                [(54.9687721704, -390.8628424946), (54.9710268923, -391.2311321553), (54.97349351, -391.5995593372), (54.9761007121, -391.9680777589)],
                knots=[0.966101498, 0.966101498, 0.966101498, 0.966101498, 0.9775096829, 0.9775096829, 0.9775096829, 0.9775096829], degree=3))
            Line((54.9761007121, -391.9680777589), (54.9732129835, -383.5142081144))
            add(Edge.make_bspline(
                [(54.9732129835, -383.5142081144), (54.971609259, -383.6696817984), (54.9701308343, -383.8252368026), (54.9687721704, -383.9808695319)],
                knots=[0.8898915397, 0.8898915397, 0.8898915397, 0.8898915397, 0.8947590922, 0.8947590922, 0.8947590922, 0.8947590922], degree=3))
            Line((54.9687721704, -383.9808695319), (54.9687721704, -390.8628424946))
        make_face()
        with BuildLine():
            Line((54.9732129835, 383.5142081144), (54.9761007121, 391.9680777589))
            add(Edge.make_bspline(
                [(54.9732129835, 383.5142081144), (54.9443452176, 386.3128046538), (54.9560766494, 389.1377502314), (54.9761007121, 391.9680777589)],
                knots=[0.8898915397, 0.8898915397, 0.8898915397, 0.8898915397, 0.9775096829, 0.9775096829, 0.9775096829, 0.9775096829], degree=3))
        make_face()
    extrude(amount=F1_DEPTH)


solid = f1.part
